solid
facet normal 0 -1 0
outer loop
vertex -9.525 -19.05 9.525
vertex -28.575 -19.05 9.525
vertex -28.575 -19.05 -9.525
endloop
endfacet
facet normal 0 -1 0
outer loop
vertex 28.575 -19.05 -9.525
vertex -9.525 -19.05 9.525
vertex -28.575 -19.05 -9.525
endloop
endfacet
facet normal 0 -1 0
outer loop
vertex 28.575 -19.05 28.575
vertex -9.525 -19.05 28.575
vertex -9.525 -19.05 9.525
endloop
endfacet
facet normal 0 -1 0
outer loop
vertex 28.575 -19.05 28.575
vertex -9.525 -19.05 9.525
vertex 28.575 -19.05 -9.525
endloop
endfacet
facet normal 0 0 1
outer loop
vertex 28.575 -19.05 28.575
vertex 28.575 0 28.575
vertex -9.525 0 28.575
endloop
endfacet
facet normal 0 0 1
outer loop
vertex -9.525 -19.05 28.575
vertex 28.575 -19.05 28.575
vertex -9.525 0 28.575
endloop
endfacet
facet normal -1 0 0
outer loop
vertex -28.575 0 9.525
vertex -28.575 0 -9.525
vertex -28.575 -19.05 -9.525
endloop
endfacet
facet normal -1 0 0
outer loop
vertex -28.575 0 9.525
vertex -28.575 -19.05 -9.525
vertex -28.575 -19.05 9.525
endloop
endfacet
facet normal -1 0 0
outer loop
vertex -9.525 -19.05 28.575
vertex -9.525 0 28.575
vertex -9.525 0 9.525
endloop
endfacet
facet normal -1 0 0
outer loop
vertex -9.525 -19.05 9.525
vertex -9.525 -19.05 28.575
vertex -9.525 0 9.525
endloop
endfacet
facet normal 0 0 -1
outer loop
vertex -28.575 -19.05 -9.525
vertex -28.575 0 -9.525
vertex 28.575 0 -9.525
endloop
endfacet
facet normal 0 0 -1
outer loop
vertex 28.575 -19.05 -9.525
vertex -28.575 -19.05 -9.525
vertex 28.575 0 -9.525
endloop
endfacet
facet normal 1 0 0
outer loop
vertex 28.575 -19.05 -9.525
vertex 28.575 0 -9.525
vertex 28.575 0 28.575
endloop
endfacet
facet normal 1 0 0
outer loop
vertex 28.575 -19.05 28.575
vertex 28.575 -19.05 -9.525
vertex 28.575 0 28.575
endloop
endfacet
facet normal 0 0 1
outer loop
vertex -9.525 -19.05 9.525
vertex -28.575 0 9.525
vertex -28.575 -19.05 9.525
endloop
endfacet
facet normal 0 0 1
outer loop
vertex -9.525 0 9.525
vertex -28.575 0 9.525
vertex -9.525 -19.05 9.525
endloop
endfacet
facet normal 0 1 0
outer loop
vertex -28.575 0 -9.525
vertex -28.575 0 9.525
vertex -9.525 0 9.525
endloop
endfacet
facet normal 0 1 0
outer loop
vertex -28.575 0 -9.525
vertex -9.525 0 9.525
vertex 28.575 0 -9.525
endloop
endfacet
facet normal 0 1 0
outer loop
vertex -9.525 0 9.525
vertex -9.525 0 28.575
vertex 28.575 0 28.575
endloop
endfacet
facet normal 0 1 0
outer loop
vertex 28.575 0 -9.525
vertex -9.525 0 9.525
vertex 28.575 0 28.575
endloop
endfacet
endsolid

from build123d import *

# Parameters (mm, degrees)
F0_W     = 19.05
F0_H     = 19.05
F1_DEPTH = 19.05


with BuildPart() as f1:
    # F0 (on Front) → F1 (new body)
    with BuildSketch(Plane.XZ):
        Rectangle(F0_W, F0_H)
        with Locations((19.05, 0)):
            Rectangle(F0_W, F0_H)
        with Locations((19.05, 19.05)):
            Rectangle(F0_W, F0_H)
        with Locations((0, 19.05)):
            Rectangle(F0_W, F0_H)
        with Locations((-19.05, 0)):
            Rectangle(F0_W, F0_H)
    extrude(amount=F1_DEPTH)


solid = f1.part
